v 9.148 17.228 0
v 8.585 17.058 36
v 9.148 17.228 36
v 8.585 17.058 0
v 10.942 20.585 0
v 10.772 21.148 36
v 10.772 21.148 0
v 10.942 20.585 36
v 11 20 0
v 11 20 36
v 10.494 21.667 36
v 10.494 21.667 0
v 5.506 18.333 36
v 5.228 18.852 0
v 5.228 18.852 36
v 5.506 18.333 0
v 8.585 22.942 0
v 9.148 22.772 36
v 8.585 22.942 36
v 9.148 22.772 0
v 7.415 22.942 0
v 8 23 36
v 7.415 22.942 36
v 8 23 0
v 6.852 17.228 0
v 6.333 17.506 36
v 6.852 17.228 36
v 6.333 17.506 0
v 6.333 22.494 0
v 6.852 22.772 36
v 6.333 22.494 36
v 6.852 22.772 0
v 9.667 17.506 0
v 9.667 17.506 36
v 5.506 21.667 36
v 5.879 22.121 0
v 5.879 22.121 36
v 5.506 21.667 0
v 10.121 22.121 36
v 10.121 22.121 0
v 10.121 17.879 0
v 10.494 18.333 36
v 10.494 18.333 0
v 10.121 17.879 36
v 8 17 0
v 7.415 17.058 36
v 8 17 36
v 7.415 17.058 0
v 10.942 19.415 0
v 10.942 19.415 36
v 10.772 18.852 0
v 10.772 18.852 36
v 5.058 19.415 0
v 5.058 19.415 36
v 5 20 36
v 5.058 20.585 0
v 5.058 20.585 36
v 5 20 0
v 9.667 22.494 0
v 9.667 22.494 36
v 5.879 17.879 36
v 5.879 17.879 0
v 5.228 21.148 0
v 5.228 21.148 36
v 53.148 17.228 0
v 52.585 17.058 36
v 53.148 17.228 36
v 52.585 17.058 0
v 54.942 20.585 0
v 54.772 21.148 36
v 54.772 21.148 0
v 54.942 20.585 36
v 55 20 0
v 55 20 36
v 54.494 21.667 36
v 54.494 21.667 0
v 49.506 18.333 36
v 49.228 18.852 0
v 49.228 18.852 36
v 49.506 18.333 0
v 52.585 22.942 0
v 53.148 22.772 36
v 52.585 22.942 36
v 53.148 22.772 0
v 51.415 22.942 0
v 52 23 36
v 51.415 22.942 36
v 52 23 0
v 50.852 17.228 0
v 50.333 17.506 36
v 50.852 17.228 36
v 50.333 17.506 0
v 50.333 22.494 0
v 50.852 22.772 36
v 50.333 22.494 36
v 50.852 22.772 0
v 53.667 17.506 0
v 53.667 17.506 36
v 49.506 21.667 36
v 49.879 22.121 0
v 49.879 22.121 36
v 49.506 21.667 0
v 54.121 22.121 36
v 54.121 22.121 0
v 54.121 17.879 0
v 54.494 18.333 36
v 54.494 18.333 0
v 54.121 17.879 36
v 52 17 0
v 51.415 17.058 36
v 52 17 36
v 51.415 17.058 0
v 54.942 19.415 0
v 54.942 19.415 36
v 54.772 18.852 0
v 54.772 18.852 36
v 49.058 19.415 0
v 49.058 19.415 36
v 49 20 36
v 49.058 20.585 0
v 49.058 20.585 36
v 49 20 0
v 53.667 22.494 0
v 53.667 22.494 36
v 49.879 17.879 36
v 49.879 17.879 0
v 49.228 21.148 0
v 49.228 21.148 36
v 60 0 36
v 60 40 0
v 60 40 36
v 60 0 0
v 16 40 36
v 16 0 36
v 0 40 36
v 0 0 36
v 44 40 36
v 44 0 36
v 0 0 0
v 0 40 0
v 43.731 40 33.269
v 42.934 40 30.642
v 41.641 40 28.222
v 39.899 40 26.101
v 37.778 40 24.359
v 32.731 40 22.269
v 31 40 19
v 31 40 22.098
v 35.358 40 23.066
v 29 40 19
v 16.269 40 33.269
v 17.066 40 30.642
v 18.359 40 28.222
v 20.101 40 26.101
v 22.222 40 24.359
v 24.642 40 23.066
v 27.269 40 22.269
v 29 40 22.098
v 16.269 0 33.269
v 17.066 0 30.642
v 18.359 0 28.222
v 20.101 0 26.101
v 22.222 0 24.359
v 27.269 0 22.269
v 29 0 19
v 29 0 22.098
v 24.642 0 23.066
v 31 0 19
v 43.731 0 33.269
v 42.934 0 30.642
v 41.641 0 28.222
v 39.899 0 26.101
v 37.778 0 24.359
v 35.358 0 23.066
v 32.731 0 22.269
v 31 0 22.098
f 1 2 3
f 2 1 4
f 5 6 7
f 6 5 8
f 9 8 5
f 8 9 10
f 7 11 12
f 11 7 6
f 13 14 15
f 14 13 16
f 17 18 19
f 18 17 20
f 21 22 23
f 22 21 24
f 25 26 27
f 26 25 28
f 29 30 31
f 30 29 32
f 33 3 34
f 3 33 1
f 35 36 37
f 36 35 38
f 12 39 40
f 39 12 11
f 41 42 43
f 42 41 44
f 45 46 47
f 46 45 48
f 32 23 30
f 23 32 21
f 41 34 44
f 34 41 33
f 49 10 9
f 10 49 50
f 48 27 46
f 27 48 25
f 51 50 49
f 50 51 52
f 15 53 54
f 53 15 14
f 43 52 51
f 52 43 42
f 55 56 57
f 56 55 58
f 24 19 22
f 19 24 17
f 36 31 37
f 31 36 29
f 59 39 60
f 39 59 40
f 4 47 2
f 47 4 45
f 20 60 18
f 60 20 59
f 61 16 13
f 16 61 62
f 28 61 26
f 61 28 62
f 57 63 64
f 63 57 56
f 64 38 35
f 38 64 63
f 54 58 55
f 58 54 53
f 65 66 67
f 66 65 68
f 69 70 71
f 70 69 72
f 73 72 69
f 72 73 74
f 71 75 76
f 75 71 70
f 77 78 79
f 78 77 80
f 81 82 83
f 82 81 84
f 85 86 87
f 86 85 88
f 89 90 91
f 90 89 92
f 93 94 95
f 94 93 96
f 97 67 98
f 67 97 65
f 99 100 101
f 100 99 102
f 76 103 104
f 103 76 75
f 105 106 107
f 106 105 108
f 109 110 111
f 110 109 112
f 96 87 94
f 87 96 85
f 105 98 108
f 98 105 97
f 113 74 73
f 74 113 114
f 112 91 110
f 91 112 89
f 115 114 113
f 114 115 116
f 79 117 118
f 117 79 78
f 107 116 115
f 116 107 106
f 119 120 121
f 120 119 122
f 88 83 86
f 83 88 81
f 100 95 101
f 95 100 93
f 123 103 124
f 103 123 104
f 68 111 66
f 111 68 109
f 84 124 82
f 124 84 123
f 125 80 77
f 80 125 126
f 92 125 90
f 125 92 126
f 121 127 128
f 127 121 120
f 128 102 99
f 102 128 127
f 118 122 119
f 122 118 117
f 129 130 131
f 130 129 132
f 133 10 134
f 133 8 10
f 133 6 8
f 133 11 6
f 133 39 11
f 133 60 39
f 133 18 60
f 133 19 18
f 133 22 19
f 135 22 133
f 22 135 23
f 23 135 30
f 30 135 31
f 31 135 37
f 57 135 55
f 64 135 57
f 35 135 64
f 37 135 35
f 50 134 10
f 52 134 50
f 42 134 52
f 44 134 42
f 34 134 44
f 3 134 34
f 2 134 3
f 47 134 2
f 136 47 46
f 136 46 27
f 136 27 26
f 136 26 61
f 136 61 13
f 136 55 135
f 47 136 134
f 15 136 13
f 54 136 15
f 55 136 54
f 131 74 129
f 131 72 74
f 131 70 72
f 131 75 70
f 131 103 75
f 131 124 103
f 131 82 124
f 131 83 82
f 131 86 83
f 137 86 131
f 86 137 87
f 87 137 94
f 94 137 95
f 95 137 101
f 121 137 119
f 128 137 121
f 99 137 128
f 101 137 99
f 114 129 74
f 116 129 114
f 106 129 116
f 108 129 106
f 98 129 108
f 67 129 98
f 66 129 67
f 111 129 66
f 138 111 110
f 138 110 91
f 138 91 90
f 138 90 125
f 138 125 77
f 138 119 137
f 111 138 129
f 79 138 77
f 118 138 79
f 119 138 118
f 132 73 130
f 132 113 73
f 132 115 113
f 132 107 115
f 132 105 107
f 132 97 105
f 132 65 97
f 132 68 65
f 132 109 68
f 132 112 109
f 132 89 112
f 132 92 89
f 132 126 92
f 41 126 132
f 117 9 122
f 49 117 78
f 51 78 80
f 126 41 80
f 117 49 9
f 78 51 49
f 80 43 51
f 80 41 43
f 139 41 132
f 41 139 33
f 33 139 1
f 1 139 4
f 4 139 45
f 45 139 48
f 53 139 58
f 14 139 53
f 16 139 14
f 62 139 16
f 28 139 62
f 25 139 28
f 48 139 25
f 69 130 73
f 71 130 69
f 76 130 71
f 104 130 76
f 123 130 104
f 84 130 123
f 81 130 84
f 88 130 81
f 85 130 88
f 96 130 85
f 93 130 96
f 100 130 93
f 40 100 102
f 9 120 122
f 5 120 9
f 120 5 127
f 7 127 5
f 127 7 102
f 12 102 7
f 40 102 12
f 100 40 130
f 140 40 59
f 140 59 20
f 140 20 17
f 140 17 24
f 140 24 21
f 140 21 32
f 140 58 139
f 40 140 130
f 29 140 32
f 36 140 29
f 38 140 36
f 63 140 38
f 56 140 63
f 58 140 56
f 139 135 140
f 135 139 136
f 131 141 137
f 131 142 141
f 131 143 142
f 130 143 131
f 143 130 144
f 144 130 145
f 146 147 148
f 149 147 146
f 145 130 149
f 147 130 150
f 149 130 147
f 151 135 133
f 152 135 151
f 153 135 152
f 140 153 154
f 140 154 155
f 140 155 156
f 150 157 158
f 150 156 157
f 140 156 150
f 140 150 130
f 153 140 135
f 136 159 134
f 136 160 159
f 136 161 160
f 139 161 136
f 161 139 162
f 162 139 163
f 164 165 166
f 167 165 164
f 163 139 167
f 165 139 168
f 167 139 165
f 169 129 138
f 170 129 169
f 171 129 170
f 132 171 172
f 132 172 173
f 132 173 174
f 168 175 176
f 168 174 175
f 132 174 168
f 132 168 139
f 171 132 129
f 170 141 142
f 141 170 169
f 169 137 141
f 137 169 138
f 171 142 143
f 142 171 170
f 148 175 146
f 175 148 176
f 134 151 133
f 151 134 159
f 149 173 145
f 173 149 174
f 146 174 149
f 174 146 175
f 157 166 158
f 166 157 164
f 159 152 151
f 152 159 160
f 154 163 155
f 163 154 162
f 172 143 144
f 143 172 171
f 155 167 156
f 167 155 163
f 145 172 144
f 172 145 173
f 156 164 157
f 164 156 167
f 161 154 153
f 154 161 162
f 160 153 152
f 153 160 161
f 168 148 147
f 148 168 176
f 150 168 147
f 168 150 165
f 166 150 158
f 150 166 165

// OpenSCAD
$fn = 32;

// ----------------------------------------------------------------------
// Saddle clamp: split shaft clamp
// ----------------------------------------------------------------------

// --- parameters (mm) ---
blk_l = 60;               // block length, X
blk_w = 40;               // block width, Y
blk_h = 36;               // block height
clamp_r = 14;             // shaft groove radius
hole_r = 3;               // bolt hole radius
hole_m = 8;               // bolt hole margin from the ends
saw_w = 2;                // saw kerf width

saw_depth = clamp_r + 3;  // saw kerf depth

difference() {
  cube([blk_l, blk_w, blk_h]);
  translate([blk_l / 2, -1, blk_h])
    rotate([-90, 0, 0])
      cylinder(h = blk_w + 2, r = clamp_r);
  for (sx = [0, 1])
    translate([sx ? blk_l - hole_m : hole_m, blk_w / 2, -1])
      cylinder(r = hole_r, h = blk_h + 2);
  translate([blk_l / 2 - saw_w / 2, -1, blk_h - saw_depth])
    cube([saw_w, blk_w + 2, saw_depth + 1]);
}
